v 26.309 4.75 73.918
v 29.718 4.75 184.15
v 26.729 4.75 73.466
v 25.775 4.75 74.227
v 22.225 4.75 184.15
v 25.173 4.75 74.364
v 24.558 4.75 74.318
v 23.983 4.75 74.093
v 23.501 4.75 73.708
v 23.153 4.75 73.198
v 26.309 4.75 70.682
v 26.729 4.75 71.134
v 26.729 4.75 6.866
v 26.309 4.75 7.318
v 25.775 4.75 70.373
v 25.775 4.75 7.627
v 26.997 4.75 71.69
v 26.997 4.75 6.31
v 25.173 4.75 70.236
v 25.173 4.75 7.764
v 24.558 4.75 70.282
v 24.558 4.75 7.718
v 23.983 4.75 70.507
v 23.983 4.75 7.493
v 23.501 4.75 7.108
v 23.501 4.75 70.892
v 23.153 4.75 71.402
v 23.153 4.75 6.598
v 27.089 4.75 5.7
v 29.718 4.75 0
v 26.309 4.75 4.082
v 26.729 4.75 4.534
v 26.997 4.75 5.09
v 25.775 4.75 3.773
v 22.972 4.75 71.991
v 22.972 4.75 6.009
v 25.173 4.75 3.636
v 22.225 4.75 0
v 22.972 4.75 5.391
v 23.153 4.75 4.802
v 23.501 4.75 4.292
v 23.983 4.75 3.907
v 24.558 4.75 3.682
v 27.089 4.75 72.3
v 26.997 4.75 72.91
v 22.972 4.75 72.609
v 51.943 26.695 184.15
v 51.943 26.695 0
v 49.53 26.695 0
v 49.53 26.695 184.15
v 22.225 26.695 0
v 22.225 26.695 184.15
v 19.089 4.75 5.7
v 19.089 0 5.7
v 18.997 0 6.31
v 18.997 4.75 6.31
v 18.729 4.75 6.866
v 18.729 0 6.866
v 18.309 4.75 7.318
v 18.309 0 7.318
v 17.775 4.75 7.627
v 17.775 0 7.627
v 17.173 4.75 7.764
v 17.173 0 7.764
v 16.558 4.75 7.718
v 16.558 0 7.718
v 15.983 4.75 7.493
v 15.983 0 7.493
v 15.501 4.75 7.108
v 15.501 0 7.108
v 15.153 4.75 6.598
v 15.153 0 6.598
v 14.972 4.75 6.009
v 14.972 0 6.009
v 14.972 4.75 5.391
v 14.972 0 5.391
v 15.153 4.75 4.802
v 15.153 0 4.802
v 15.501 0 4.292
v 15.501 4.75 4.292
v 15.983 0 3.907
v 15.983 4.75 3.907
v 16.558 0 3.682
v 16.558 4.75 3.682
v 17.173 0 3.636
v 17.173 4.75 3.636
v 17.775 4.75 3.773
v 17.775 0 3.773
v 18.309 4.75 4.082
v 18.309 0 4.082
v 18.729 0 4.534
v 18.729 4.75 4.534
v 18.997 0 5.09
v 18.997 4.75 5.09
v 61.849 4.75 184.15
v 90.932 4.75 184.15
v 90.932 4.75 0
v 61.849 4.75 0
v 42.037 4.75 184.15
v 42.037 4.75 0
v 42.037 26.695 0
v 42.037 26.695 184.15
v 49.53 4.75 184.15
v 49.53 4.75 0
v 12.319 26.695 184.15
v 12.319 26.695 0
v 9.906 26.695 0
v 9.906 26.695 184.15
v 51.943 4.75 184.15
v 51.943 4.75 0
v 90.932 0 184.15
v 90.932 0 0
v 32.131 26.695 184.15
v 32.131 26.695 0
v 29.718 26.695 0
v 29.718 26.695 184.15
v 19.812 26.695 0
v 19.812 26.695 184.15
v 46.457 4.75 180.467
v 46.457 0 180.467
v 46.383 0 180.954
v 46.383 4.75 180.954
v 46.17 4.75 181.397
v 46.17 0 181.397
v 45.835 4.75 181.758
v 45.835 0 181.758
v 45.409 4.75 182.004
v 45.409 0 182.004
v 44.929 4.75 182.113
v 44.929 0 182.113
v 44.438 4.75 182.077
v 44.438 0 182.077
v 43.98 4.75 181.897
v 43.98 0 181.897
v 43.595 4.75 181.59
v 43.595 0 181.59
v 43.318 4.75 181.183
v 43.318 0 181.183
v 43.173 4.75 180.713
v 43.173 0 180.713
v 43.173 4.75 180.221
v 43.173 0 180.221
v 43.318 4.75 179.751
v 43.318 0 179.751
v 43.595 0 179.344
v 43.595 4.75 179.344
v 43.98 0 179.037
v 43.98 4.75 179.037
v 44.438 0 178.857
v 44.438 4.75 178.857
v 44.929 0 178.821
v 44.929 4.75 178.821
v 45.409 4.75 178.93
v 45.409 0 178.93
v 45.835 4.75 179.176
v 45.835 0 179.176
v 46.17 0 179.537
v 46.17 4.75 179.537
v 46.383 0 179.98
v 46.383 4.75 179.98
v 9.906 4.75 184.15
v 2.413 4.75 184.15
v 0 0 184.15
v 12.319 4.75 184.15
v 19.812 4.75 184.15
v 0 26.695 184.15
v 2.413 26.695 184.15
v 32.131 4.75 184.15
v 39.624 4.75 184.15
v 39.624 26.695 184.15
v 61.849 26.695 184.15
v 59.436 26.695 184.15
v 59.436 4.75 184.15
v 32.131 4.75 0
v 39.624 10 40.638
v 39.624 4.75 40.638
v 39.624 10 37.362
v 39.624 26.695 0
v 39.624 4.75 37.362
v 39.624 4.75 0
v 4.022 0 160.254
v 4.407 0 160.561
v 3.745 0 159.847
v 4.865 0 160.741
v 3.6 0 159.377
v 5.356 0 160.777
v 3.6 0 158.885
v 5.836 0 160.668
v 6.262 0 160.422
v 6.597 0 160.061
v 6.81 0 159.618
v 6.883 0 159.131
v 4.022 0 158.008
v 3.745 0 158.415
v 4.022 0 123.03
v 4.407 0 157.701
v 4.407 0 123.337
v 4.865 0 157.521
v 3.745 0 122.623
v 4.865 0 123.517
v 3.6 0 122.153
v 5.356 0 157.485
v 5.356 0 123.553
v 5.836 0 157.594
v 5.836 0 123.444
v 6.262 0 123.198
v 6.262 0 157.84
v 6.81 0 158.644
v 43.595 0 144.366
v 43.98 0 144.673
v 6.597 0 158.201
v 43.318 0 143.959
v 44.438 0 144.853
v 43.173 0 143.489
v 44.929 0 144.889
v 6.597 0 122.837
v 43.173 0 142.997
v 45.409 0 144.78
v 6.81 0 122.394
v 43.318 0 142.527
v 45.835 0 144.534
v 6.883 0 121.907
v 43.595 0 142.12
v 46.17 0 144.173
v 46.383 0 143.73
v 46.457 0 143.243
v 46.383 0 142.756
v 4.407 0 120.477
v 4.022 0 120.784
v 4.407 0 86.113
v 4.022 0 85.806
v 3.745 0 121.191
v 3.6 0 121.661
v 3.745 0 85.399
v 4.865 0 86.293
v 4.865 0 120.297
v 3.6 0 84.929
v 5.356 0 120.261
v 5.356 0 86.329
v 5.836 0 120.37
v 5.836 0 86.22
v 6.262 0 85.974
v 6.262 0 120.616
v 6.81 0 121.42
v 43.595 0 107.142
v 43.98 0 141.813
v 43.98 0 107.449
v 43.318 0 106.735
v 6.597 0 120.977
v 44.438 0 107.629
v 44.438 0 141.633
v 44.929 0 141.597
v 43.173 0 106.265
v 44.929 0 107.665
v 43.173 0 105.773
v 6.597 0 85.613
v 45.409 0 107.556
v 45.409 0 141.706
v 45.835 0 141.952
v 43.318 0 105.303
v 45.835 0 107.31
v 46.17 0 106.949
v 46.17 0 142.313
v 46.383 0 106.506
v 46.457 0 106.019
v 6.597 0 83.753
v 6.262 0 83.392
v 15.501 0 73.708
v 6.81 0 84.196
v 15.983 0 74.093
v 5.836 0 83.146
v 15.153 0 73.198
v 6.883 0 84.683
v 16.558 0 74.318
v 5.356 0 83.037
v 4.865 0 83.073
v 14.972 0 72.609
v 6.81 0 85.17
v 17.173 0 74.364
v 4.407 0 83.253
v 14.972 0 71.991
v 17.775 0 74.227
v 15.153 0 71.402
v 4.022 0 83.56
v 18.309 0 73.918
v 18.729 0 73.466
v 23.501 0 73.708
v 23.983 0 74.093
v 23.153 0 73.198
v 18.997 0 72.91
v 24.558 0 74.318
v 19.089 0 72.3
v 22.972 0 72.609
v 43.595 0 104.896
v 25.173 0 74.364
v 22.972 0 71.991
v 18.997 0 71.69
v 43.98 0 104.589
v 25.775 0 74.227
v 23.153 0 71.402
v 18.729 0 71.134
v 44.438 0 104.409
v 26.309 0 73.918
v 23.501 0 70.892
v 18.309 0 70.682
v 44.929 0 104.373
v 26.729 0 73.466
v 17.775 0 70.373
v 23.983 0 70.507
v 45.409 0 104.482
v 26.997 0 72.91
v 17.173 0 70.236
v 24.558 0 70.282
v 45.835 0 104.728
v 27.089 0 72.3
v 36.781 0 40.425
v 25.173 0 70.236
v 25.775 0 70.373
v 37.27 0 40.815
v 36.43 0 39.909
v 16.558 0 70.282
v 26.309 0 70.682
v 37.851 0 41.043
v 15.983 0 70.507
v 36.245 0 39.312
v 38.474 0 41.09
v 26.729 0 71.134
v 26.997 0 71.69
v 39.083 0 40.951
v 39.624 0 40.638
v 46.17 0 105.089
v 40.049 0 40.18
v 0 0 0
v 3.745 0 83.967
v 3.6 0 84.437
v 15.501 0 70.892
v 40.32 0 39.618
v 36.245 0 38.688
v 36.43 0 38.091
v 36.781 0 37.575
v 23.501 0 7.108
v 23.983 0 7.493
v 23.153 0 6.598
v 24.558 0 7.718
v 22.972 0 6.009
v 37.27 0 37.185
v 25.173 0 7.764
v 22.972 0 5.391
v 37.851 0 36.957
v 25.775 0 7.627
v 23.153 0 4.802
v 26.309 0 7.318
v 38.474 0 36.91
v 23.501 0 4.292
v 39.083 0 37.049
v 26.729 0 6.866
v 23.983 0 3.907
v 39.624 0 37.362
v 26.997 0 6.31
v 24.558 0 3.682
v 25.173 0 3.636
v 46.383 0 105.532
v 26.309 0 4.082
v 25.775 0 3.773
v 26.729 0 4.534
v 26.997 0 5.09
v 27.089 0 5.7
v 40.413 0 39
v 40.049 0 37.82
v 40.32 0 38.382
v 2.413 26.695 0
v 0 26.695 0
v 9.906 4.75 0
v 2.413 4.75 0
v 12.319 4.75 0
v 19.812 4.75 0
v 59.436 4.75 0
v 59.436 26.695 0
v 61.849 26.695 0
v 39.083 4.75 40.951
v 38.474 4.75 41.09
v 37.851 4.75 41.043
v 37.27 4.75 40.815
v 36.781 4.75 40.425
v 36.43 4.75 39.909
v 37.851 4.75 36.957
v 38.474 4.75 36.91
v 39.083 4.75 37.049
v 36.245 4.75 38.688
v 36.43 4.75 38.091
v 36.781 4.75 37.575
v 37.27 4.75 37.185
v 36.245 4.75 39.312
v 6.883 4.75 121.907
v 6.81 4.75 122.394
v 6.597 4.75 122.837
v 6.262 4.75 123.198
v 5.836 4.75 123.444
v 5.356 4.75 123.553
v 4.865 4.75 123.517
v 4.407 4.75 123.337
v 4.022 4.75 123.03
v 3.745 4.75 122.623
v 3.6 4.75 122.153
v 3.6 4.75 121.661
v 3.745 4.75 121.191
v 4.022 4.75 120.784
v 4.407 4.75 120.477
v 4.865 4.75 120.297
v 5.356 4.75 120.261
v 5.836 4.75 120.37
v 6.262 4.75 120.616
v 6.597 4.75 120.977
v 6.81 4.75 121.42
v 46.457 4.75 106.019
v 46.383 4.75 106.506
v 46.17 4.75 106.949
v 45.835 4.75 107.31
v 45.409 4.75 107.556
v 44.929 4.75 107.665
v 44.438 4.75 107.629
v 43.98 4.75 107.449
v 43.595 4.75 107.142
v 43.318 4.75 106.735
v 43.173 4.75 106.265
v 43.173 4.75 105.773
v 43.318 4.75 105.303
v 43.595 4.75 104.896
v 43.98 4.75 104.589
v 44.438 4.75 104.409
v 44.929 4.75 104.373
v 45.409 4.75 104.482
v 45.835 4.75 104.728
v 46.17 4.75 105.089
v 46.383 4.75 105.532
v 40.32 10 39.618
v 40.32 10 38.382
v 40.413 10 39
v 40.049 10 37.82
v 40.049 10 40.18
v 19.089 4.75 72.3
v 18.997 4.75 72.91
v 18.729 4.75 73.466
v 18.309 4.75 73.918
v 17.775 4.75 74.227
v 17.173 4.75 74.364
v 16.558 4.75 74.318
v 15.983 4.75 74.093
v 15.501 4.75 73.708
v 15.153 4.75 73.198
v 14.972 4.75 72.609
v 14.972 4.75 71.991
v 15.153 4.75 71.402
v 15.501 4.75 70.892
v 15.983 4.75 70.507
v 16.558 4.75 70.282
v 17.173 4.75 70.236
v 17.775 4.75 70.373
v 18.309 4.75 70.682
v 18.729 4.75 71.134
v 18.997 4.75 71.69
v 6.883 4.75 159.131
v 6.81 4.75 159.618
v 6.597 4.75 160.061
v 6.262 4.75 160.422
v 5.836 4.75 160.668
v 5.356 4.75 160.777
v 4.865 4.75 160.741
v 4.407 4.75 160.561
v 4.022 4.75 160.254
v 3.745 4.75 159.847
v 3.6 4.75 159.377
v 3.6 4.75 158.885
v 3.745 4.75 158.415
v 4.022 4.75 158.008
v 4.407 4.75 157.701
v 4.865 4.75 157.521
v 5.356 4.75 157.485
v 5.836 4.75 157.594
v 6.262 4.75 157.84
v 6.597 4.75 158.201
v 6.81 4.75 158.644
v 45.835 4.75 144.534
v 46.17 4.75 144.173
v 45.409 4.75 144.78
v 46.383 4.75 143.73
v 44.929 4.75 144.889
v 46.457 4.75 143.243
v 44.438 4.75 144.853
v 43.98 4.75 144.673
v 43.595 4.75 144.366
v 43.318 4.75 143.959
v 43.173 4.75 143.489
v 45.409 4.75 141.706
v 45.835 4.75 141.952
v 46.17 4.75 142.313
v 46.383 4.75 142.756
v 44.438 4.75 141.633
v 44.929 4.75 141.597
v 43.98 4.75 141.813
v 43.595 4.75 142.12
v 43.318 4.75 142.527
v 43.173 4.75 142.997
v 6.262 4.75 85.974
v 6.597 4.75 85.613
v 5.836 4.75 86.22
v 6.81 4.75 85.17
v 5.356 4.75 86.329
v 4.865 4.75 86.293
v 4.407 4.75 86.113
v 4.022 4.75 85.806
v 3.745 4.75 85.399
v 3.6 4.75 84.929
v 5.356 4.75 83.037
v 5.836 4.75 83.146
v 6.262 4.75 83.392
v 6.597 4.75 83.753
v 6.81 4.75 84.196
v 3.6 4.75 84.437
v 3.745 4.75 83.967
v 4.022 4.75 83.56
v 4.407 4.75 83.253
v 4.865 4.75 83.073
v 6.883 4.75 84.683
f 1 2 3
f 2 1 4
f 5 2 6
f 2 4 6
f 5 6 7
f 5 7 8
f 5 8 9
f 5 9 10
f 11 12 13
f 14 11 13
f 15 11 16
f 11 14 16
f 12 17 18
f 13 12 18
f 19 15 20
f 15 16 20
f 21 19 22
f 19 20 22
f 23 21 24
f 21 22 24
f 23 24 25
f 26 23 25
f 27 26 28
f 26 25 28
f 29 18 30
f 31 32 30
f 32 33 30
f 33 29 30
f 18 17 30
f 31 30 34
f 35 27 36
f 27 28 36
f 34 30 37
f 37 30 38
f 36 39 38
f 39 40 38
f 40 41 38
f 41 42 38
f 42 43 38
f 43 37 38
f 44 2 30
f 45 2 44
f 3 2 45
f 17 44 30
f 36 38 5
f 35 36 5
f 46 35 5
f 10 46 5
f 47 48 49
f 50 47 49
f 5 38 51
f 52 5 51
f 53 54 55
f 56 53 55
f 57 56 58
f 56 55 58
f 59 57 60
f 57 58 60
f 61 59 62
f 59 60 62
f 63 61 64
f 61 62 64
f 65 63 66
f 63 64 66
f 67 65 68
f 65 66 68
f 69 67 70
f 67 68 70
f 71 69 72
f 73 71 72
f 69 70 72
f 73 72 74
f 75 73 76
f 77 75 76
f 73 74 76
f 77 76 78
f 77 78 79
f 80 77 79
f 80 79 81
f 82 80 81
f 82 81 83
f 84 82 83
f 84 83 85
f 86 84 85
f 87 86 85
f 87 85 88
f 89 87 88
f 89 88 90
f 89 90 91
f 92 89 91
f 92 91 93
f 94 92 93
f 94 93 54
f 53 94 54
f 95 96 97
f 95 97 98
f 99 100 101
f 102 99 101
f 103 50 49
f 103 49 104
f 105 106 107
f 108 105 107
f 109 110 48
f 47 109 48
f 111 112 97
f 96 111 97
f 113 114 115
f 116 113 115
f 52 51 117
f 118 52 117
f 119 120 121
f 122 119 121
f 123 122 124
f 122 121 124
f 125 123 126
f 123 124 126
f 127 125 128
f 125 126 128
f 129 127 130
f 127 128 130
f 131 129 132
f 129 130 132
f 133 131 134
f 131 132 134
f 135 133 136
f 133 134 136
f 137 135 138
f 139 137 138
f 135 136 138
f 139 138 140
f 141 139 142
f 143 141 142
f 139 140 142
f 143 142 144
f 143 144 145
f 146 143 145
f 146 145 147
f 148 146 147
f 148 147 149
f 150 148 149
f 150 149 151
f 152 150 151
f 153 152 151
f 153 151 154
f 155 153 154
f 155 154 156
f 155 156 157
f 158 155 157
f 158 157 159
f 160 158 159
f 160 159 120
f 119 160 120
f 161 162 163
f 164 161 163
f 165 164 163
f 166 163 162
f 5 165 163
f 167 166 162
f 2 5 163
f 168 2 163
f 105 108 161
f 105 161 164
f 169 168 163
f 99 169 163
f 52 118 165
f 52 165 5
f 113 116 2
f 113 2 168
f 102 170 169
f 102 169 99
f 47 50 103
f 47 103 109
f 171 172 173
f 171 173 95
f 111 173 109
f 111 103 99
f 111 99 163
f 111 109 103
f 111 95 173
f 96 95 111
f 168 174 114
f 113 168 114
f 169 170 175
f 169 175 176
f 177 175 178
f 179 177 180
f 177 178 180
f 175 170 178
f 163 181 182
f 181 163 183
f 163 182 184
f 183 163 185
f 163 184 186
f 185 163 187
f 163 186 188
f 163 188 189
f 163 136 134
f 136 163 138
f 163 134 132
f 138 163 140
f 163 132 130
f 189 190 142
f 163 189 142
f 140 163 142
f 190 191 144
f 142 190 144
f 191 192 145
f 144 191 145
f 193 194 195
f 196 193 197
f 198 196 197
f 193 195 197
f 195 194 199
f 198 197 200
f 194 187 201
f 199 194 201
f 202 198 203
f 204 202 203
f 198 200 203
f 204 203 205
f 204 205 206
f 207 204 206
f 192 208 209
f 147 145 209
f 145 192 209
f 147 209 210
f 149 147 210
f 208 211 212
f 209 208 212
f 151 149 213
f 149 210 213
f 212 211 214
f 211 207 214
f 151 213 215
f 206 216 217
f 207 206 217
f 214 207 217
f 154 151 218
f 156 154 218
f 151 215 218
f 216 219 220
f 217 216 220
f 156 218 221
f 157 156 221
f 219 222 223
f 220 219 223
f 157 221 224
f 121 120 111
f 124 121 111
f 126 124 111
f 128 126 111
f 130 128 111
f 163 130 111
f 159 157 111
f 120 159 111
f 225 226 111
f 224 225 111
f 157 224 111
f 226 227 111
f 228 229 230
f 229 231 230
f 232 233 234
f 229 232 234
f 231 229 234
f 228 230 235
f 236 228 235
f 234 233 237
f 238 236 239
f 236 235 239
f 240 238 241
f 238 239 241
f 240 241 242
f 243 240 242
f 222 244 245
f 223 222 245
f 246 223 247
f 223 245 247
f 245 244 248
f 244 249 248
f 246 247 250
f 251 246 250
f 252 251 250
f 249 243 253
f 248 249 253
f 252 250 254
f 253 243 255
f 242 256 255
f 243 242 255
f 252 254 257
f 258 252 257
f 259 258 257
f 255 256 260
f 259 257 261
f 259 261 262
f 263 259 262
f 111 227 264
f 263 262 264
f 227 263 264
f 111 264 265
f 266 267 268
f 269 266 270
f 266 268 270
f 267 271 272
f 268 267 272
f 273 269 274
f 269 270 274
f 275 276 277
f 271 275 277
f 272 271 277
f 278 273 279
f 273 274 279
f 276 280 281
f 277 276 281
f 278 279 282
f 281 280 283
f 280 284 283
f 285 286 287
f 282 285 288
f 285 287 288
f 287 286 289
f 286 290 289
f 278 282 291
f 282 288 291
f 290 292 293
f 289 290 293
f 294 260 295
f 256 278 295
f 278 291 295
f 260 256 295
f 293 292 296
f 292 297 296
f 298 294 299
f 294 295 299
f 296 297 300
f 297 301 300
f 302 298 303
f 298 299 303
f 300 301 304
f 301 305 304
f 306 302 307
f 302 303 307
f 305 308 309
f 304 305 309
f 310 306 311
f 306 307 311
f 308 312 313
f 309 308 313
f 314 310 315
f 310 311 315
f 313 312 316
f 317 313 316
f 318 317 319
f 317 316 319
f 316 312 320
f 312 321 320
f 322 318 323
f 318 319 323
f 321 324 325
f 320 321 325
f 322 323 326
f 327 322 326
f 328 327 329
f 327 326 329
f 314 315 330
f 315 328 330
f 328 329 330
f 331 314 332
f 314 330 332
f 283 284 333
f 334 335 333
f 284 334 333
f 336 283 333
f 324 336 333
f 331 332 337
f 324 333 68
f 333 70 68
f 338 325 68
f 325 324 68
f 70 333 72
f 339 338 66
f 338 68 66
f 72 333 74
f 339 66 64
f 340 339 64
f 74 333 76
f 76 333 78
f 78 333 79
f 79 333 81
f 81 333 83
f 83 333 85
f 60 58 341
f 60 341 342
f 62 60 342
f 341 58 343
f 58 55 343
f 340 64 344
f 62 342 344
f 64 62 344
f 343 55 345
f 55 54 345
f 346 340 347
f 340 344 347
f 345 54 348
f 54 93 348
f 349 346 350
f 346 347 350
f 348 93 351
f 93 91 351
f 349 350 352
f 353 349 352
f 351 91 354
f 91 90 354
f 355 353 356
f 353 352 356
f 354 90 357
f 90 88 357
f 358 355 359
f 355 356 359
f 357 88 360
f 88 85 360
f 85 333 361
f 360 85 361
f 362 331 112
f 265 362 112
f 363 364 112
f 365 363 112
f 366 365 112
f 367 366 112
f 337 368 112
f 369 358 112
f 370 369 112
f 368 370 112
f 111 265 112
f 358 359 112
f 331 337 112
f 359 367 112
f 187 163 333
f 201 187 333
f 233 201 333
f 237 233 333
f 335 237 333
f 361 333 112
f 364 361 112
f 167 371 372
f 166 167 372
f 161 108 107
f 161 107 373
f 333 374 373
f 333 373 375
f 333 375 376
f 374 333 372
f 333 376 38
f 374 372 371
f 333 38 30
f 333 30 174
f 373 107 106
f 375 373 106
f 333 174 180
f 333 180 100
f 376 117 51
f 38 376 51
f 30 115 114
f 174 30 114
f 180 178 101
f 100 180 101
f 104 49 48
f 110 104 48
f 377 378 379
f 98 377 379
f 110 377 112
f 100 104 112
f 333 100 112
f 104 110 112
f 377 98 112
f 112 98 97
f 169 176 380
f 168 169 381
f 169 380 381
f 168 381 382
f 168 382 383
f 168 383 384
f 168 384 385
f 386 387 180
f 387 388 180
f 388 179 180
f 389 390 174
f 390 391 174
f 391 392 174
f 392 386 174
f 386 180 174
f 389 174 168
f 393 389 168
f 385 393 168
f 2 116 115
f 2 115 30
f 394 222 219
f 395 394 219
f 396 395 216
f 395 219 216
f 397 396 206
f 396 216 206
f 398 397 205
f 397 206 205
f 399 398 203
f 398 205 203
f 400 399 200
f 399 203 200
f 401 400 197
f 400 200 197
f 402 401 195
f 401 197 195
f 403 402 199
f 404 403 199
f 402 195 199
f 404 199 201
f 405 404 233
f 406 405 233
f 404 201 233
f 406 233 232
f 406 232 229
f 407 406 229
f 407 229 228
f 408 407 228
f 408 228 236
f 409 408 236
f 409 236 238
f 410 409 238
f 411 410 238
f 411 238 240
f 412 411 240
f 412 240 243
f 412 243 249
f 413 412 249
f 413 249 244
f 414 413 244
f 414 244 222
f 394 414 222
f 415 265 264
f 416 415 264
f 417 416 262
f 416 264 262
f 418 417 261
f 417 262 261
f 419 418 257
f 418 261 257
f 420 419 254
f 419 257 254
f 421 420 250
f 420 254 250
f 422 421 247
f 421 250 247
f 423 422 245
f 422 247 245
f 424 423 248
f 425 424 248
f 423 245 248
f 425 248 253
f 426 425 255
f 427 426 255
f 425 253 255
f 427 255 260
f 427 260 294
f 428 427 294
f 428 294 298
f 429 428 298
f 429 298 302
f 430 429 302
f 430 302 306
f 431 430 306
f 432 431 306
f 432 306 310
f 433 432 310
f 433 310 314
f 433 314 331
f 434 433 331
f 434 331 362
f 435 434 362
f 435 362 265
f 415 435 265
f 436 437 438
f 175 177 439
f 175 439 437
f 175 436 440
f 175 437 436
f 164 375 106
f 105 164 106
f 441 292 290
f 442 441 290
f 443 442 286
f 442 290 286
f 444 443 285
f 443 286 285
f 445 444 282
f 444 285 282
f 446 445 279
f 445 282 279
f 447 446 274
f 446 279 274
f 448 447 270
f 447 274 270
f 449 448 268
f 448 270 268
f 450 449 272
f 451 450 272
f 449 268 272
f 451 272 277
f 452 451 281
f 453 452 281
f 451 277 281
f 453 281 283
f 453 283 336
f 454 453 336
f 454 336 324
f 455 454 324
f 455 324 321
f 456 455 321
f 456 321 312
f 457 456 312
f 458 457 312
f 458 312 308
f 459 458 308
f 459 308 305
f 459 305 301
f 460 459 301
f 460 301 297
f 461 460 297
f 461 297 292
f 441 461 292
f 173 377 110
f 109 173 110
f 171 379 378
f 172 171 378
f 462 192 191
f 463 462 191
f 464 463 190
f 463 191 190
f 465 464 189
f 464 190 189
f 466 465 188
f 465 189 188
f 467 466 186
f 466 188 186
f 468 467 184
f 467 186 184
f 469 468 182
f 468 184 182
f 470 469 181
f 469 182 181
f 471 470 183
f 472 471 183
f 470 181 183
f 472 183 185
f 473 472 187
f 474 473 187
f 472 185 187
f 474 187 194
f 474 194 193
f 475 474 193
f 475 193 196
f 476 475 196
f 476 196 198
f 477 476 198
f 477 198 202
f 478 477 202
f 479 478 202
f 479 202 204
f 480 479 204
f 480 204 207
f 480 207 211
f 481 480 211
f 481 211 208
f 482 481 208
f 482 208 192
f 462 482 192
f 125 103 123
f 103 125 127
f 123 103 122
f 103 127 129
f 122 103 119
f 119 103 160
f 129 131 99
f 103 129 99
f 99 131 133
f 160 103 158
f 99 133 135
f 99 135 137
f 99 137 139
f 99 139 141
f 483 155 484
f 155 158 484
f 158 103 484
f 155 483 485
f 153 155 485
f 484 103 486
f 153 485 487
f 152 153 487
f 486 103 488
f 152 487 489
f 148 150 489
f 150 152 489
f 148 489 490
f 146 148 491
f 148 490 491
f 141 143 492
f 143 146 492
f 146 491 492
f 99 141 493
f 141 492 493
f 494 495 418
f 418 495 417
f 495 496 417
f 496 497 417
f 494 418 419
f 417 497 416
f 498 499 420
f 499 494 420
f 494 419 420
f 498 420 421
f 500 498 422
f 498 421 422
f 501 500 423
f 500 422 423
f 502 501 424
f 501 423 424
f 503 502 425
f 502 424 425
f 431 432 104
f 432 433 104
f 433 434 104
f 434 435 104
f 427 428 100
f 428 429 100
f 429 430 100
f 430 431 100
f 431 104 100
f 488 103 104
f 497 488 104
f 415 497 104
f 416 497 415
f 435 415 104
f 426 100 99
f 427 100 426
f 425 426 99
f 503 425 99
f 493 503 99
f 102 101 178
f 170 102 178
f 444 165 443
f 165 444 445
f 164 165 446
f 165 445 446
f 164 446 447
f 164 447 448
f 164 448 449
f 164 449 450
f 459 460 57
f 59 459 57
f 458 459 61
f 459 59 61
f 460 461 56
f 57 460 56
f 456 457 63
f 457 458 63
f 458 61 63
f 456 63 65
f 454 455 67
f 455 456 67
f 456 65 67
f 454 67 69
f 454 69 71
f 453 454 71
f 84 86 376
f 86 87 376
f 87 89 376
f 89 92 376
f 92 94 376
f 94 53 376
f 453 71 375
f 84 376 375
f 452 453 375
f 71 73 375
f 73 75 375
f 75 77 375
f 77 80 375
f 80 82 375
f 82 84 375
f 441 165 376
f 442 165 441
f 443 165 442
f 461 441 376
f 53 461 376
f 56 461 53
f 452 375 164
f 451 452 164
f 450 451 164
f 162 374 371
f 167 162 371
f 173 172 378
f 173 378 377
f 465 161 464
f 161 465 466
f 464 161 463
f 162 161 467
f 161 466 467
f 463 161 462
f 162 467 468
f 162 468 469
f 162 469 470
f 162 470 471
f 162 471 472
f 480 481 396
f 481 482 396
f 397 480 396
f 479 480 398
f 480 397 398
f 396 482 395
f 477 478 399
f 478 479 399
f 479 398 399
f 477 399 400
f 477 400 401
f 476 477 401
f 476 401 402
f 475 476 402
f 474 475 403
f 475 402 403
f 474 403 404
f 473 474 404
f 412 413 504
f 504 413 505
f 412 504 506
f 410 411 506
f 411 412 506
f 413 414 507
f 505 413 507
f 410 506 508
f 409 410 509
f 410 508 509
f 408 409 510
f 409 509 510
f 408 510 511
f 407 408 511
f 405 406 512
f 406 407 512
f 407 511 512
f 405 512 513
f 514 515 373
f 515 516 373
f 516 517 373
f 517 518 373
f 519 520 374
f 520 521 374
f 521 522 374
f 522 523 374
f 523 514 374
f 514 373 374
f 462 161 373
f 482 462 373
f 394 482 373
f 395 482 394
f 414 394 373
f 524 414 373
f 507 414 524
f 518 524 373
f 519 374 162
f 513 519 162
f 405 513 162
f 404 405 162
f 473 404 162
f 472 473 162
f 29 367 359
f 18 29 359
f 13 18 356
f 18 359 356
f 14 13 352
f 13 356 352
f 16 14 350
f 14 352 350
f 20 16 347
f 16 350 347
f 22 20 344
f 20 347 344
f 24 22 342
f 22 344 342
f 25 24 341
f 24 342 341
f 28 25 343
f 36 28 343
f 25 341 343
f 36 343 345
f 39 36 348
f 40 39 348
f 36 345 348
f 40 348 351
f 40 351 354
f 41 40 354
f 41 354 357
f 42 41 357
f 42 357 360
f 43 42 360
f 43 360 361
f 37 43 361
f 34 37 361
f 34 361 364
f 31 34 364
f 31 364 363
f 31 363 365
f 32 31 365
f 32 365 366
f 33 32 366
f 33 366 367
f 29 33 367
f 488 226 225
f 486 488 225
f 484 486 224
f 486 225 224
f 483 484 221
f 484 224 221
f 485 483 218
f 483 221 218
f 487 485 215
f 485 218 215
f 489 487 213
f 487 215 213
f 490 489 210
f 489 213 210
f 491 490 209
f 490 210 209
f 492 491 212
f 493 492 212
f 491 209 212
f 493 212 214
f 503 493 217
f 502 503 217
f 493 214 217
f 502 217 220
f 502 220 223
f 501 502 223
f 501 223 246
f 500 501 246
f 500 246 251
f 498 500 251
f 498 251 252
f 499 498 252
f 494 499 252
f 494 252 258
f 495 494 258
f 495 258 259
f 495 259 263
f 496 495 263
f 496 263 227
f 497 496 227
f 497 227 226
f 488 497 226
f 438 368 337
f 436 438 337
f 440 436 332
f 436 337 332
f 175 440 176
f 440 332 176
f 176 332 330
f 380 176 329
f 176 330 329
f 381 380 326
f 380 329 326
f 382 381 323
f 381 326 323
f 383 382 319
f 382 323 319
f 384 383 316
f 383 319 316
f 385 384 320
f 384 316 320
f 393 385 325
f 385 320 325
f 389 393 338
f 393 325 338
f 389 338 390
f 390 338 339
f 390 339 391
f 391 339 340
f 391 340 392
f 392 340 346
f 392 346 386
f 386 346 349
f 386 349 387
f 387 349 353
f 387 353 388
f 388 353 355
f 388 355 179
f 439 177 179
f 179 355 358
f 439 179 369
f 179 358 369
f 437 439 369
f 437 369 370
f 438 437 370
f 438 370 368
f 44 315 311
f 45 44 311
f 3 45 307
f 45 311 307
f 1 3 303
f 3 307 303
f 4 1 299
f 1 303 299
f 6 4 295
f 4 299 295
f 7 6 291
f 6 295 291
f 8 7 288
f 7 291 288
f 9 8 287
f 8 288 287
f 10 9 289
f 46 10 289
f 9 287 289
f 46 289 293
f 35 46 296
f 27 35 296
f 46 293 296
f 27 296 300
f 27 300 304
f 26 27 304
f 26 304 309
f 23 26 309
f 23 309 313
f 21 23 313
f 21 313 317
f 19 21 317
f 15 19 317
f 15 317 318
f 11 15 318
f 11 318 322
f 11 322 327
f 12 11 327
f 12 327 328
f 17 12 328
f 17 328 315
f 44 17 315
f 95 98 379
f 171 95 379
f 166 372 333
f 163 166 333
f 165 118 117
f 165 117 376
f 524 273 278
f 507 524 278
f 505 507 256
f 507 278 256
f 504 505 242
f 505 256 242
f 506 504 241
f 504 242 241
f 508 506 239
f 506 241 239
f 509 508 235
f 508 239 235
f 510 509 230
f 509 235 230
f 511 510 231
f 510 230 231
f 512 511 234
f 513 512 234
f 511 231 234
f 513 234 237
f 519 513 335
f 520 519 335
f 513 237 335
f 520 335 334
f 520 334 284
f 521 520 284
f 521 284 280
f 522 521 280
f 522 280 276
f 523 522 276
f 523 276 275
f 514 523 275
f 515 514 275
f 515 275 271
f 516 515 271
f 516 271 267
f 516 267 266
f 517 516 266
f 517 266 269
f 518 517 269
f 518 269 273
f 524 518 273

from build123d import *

# Parameters (mm, degrees)
BOSS_EXTRUDE1_DEPTH = 184.15
SKETCH2_R           = 1.651
SKETCH2_R_2         = 2.0701
SKETCH2_R_3         = 2.0955
CUT_EXTRUDE3_DEPTH  = 10


with BuildPart() as part:
    # Sketch1 → Boss-Extrude1 (new body)
    with BuildSketch(Plane.XY):
        Polygon((2.413, 26.6954), (0, 26.6954), (0, 4.7498), (0, 0), (61.849, 0), (69.342, 0), (90.932, 0), (90.932, 4.7498), (69.342, 4.7498), (61.849, 4.7498), (61.849, 26.6954), (59.436, 26.6954), (59.436, 4.7498), (51.943, 4.7498), (51.943, 26.6954), (49.53, 26.6954), (49.53, 4.7498), (42.037, 4.7498), (42.037, 26.6954), (39.624, 26.6954), (39.624, 4.7498), (32.131, 4.7498), (32.131, 26.6954), (29.718, 26.6954), (29.718, 4.7498), (22.225, 4.7498), (22.225, 26.6954), (19.812, 26.6954), (19.812, 4.7498), (12.319, 4.7498), (12.319, 26.6954), (9.906, 26.6954), (9.906, 4.7498), (2.413, 4.7498), align=None)
    extrude(amount=BOSS_EXTRUDE1_DEPTH)

    # Sketch2 → Cut-Extrude3 (cut)
    with BuildSketch(Plane.XZ):
        with Locations((5.2324, 159.131)):
            Circle(SKETCH2_R)
        with Locations((44.8056, 180.467)):
            Circle(SKETCH2_R)
        with Locations((44.8056, 143.243)):
            Circle(SKETCH2_R)
        with Locations((5.2324, 121.907)):
            Circle(SKETCH2_R)
        with Locations((5.2324, 84.683)):
            Circle(SKETCH2_R)
        with Locations((44.8056, 106.019)):
            Circle(SKETCH2_R)
        with Locations((17.0185, 72.3)):
            Circle(SKETCH2_R_2)
        with Locations((25.0185, 72.3)):
            Circle(SKETCH2_R_2)
        with Locations((25.0185, 5.7)):
            Circle(SKETCH2_R_2)
        with Locations((17.0185, 5.7)):
            Circle(SKETCH2_R_2)
        with Locations((38.317522863, 39)):
            Circle(SKETCH2_R_3)
    extrude(amount=-CUT_EXTRUDE3_DEPTH, mode=Mode.SUBTRACT)


solid = part.part
